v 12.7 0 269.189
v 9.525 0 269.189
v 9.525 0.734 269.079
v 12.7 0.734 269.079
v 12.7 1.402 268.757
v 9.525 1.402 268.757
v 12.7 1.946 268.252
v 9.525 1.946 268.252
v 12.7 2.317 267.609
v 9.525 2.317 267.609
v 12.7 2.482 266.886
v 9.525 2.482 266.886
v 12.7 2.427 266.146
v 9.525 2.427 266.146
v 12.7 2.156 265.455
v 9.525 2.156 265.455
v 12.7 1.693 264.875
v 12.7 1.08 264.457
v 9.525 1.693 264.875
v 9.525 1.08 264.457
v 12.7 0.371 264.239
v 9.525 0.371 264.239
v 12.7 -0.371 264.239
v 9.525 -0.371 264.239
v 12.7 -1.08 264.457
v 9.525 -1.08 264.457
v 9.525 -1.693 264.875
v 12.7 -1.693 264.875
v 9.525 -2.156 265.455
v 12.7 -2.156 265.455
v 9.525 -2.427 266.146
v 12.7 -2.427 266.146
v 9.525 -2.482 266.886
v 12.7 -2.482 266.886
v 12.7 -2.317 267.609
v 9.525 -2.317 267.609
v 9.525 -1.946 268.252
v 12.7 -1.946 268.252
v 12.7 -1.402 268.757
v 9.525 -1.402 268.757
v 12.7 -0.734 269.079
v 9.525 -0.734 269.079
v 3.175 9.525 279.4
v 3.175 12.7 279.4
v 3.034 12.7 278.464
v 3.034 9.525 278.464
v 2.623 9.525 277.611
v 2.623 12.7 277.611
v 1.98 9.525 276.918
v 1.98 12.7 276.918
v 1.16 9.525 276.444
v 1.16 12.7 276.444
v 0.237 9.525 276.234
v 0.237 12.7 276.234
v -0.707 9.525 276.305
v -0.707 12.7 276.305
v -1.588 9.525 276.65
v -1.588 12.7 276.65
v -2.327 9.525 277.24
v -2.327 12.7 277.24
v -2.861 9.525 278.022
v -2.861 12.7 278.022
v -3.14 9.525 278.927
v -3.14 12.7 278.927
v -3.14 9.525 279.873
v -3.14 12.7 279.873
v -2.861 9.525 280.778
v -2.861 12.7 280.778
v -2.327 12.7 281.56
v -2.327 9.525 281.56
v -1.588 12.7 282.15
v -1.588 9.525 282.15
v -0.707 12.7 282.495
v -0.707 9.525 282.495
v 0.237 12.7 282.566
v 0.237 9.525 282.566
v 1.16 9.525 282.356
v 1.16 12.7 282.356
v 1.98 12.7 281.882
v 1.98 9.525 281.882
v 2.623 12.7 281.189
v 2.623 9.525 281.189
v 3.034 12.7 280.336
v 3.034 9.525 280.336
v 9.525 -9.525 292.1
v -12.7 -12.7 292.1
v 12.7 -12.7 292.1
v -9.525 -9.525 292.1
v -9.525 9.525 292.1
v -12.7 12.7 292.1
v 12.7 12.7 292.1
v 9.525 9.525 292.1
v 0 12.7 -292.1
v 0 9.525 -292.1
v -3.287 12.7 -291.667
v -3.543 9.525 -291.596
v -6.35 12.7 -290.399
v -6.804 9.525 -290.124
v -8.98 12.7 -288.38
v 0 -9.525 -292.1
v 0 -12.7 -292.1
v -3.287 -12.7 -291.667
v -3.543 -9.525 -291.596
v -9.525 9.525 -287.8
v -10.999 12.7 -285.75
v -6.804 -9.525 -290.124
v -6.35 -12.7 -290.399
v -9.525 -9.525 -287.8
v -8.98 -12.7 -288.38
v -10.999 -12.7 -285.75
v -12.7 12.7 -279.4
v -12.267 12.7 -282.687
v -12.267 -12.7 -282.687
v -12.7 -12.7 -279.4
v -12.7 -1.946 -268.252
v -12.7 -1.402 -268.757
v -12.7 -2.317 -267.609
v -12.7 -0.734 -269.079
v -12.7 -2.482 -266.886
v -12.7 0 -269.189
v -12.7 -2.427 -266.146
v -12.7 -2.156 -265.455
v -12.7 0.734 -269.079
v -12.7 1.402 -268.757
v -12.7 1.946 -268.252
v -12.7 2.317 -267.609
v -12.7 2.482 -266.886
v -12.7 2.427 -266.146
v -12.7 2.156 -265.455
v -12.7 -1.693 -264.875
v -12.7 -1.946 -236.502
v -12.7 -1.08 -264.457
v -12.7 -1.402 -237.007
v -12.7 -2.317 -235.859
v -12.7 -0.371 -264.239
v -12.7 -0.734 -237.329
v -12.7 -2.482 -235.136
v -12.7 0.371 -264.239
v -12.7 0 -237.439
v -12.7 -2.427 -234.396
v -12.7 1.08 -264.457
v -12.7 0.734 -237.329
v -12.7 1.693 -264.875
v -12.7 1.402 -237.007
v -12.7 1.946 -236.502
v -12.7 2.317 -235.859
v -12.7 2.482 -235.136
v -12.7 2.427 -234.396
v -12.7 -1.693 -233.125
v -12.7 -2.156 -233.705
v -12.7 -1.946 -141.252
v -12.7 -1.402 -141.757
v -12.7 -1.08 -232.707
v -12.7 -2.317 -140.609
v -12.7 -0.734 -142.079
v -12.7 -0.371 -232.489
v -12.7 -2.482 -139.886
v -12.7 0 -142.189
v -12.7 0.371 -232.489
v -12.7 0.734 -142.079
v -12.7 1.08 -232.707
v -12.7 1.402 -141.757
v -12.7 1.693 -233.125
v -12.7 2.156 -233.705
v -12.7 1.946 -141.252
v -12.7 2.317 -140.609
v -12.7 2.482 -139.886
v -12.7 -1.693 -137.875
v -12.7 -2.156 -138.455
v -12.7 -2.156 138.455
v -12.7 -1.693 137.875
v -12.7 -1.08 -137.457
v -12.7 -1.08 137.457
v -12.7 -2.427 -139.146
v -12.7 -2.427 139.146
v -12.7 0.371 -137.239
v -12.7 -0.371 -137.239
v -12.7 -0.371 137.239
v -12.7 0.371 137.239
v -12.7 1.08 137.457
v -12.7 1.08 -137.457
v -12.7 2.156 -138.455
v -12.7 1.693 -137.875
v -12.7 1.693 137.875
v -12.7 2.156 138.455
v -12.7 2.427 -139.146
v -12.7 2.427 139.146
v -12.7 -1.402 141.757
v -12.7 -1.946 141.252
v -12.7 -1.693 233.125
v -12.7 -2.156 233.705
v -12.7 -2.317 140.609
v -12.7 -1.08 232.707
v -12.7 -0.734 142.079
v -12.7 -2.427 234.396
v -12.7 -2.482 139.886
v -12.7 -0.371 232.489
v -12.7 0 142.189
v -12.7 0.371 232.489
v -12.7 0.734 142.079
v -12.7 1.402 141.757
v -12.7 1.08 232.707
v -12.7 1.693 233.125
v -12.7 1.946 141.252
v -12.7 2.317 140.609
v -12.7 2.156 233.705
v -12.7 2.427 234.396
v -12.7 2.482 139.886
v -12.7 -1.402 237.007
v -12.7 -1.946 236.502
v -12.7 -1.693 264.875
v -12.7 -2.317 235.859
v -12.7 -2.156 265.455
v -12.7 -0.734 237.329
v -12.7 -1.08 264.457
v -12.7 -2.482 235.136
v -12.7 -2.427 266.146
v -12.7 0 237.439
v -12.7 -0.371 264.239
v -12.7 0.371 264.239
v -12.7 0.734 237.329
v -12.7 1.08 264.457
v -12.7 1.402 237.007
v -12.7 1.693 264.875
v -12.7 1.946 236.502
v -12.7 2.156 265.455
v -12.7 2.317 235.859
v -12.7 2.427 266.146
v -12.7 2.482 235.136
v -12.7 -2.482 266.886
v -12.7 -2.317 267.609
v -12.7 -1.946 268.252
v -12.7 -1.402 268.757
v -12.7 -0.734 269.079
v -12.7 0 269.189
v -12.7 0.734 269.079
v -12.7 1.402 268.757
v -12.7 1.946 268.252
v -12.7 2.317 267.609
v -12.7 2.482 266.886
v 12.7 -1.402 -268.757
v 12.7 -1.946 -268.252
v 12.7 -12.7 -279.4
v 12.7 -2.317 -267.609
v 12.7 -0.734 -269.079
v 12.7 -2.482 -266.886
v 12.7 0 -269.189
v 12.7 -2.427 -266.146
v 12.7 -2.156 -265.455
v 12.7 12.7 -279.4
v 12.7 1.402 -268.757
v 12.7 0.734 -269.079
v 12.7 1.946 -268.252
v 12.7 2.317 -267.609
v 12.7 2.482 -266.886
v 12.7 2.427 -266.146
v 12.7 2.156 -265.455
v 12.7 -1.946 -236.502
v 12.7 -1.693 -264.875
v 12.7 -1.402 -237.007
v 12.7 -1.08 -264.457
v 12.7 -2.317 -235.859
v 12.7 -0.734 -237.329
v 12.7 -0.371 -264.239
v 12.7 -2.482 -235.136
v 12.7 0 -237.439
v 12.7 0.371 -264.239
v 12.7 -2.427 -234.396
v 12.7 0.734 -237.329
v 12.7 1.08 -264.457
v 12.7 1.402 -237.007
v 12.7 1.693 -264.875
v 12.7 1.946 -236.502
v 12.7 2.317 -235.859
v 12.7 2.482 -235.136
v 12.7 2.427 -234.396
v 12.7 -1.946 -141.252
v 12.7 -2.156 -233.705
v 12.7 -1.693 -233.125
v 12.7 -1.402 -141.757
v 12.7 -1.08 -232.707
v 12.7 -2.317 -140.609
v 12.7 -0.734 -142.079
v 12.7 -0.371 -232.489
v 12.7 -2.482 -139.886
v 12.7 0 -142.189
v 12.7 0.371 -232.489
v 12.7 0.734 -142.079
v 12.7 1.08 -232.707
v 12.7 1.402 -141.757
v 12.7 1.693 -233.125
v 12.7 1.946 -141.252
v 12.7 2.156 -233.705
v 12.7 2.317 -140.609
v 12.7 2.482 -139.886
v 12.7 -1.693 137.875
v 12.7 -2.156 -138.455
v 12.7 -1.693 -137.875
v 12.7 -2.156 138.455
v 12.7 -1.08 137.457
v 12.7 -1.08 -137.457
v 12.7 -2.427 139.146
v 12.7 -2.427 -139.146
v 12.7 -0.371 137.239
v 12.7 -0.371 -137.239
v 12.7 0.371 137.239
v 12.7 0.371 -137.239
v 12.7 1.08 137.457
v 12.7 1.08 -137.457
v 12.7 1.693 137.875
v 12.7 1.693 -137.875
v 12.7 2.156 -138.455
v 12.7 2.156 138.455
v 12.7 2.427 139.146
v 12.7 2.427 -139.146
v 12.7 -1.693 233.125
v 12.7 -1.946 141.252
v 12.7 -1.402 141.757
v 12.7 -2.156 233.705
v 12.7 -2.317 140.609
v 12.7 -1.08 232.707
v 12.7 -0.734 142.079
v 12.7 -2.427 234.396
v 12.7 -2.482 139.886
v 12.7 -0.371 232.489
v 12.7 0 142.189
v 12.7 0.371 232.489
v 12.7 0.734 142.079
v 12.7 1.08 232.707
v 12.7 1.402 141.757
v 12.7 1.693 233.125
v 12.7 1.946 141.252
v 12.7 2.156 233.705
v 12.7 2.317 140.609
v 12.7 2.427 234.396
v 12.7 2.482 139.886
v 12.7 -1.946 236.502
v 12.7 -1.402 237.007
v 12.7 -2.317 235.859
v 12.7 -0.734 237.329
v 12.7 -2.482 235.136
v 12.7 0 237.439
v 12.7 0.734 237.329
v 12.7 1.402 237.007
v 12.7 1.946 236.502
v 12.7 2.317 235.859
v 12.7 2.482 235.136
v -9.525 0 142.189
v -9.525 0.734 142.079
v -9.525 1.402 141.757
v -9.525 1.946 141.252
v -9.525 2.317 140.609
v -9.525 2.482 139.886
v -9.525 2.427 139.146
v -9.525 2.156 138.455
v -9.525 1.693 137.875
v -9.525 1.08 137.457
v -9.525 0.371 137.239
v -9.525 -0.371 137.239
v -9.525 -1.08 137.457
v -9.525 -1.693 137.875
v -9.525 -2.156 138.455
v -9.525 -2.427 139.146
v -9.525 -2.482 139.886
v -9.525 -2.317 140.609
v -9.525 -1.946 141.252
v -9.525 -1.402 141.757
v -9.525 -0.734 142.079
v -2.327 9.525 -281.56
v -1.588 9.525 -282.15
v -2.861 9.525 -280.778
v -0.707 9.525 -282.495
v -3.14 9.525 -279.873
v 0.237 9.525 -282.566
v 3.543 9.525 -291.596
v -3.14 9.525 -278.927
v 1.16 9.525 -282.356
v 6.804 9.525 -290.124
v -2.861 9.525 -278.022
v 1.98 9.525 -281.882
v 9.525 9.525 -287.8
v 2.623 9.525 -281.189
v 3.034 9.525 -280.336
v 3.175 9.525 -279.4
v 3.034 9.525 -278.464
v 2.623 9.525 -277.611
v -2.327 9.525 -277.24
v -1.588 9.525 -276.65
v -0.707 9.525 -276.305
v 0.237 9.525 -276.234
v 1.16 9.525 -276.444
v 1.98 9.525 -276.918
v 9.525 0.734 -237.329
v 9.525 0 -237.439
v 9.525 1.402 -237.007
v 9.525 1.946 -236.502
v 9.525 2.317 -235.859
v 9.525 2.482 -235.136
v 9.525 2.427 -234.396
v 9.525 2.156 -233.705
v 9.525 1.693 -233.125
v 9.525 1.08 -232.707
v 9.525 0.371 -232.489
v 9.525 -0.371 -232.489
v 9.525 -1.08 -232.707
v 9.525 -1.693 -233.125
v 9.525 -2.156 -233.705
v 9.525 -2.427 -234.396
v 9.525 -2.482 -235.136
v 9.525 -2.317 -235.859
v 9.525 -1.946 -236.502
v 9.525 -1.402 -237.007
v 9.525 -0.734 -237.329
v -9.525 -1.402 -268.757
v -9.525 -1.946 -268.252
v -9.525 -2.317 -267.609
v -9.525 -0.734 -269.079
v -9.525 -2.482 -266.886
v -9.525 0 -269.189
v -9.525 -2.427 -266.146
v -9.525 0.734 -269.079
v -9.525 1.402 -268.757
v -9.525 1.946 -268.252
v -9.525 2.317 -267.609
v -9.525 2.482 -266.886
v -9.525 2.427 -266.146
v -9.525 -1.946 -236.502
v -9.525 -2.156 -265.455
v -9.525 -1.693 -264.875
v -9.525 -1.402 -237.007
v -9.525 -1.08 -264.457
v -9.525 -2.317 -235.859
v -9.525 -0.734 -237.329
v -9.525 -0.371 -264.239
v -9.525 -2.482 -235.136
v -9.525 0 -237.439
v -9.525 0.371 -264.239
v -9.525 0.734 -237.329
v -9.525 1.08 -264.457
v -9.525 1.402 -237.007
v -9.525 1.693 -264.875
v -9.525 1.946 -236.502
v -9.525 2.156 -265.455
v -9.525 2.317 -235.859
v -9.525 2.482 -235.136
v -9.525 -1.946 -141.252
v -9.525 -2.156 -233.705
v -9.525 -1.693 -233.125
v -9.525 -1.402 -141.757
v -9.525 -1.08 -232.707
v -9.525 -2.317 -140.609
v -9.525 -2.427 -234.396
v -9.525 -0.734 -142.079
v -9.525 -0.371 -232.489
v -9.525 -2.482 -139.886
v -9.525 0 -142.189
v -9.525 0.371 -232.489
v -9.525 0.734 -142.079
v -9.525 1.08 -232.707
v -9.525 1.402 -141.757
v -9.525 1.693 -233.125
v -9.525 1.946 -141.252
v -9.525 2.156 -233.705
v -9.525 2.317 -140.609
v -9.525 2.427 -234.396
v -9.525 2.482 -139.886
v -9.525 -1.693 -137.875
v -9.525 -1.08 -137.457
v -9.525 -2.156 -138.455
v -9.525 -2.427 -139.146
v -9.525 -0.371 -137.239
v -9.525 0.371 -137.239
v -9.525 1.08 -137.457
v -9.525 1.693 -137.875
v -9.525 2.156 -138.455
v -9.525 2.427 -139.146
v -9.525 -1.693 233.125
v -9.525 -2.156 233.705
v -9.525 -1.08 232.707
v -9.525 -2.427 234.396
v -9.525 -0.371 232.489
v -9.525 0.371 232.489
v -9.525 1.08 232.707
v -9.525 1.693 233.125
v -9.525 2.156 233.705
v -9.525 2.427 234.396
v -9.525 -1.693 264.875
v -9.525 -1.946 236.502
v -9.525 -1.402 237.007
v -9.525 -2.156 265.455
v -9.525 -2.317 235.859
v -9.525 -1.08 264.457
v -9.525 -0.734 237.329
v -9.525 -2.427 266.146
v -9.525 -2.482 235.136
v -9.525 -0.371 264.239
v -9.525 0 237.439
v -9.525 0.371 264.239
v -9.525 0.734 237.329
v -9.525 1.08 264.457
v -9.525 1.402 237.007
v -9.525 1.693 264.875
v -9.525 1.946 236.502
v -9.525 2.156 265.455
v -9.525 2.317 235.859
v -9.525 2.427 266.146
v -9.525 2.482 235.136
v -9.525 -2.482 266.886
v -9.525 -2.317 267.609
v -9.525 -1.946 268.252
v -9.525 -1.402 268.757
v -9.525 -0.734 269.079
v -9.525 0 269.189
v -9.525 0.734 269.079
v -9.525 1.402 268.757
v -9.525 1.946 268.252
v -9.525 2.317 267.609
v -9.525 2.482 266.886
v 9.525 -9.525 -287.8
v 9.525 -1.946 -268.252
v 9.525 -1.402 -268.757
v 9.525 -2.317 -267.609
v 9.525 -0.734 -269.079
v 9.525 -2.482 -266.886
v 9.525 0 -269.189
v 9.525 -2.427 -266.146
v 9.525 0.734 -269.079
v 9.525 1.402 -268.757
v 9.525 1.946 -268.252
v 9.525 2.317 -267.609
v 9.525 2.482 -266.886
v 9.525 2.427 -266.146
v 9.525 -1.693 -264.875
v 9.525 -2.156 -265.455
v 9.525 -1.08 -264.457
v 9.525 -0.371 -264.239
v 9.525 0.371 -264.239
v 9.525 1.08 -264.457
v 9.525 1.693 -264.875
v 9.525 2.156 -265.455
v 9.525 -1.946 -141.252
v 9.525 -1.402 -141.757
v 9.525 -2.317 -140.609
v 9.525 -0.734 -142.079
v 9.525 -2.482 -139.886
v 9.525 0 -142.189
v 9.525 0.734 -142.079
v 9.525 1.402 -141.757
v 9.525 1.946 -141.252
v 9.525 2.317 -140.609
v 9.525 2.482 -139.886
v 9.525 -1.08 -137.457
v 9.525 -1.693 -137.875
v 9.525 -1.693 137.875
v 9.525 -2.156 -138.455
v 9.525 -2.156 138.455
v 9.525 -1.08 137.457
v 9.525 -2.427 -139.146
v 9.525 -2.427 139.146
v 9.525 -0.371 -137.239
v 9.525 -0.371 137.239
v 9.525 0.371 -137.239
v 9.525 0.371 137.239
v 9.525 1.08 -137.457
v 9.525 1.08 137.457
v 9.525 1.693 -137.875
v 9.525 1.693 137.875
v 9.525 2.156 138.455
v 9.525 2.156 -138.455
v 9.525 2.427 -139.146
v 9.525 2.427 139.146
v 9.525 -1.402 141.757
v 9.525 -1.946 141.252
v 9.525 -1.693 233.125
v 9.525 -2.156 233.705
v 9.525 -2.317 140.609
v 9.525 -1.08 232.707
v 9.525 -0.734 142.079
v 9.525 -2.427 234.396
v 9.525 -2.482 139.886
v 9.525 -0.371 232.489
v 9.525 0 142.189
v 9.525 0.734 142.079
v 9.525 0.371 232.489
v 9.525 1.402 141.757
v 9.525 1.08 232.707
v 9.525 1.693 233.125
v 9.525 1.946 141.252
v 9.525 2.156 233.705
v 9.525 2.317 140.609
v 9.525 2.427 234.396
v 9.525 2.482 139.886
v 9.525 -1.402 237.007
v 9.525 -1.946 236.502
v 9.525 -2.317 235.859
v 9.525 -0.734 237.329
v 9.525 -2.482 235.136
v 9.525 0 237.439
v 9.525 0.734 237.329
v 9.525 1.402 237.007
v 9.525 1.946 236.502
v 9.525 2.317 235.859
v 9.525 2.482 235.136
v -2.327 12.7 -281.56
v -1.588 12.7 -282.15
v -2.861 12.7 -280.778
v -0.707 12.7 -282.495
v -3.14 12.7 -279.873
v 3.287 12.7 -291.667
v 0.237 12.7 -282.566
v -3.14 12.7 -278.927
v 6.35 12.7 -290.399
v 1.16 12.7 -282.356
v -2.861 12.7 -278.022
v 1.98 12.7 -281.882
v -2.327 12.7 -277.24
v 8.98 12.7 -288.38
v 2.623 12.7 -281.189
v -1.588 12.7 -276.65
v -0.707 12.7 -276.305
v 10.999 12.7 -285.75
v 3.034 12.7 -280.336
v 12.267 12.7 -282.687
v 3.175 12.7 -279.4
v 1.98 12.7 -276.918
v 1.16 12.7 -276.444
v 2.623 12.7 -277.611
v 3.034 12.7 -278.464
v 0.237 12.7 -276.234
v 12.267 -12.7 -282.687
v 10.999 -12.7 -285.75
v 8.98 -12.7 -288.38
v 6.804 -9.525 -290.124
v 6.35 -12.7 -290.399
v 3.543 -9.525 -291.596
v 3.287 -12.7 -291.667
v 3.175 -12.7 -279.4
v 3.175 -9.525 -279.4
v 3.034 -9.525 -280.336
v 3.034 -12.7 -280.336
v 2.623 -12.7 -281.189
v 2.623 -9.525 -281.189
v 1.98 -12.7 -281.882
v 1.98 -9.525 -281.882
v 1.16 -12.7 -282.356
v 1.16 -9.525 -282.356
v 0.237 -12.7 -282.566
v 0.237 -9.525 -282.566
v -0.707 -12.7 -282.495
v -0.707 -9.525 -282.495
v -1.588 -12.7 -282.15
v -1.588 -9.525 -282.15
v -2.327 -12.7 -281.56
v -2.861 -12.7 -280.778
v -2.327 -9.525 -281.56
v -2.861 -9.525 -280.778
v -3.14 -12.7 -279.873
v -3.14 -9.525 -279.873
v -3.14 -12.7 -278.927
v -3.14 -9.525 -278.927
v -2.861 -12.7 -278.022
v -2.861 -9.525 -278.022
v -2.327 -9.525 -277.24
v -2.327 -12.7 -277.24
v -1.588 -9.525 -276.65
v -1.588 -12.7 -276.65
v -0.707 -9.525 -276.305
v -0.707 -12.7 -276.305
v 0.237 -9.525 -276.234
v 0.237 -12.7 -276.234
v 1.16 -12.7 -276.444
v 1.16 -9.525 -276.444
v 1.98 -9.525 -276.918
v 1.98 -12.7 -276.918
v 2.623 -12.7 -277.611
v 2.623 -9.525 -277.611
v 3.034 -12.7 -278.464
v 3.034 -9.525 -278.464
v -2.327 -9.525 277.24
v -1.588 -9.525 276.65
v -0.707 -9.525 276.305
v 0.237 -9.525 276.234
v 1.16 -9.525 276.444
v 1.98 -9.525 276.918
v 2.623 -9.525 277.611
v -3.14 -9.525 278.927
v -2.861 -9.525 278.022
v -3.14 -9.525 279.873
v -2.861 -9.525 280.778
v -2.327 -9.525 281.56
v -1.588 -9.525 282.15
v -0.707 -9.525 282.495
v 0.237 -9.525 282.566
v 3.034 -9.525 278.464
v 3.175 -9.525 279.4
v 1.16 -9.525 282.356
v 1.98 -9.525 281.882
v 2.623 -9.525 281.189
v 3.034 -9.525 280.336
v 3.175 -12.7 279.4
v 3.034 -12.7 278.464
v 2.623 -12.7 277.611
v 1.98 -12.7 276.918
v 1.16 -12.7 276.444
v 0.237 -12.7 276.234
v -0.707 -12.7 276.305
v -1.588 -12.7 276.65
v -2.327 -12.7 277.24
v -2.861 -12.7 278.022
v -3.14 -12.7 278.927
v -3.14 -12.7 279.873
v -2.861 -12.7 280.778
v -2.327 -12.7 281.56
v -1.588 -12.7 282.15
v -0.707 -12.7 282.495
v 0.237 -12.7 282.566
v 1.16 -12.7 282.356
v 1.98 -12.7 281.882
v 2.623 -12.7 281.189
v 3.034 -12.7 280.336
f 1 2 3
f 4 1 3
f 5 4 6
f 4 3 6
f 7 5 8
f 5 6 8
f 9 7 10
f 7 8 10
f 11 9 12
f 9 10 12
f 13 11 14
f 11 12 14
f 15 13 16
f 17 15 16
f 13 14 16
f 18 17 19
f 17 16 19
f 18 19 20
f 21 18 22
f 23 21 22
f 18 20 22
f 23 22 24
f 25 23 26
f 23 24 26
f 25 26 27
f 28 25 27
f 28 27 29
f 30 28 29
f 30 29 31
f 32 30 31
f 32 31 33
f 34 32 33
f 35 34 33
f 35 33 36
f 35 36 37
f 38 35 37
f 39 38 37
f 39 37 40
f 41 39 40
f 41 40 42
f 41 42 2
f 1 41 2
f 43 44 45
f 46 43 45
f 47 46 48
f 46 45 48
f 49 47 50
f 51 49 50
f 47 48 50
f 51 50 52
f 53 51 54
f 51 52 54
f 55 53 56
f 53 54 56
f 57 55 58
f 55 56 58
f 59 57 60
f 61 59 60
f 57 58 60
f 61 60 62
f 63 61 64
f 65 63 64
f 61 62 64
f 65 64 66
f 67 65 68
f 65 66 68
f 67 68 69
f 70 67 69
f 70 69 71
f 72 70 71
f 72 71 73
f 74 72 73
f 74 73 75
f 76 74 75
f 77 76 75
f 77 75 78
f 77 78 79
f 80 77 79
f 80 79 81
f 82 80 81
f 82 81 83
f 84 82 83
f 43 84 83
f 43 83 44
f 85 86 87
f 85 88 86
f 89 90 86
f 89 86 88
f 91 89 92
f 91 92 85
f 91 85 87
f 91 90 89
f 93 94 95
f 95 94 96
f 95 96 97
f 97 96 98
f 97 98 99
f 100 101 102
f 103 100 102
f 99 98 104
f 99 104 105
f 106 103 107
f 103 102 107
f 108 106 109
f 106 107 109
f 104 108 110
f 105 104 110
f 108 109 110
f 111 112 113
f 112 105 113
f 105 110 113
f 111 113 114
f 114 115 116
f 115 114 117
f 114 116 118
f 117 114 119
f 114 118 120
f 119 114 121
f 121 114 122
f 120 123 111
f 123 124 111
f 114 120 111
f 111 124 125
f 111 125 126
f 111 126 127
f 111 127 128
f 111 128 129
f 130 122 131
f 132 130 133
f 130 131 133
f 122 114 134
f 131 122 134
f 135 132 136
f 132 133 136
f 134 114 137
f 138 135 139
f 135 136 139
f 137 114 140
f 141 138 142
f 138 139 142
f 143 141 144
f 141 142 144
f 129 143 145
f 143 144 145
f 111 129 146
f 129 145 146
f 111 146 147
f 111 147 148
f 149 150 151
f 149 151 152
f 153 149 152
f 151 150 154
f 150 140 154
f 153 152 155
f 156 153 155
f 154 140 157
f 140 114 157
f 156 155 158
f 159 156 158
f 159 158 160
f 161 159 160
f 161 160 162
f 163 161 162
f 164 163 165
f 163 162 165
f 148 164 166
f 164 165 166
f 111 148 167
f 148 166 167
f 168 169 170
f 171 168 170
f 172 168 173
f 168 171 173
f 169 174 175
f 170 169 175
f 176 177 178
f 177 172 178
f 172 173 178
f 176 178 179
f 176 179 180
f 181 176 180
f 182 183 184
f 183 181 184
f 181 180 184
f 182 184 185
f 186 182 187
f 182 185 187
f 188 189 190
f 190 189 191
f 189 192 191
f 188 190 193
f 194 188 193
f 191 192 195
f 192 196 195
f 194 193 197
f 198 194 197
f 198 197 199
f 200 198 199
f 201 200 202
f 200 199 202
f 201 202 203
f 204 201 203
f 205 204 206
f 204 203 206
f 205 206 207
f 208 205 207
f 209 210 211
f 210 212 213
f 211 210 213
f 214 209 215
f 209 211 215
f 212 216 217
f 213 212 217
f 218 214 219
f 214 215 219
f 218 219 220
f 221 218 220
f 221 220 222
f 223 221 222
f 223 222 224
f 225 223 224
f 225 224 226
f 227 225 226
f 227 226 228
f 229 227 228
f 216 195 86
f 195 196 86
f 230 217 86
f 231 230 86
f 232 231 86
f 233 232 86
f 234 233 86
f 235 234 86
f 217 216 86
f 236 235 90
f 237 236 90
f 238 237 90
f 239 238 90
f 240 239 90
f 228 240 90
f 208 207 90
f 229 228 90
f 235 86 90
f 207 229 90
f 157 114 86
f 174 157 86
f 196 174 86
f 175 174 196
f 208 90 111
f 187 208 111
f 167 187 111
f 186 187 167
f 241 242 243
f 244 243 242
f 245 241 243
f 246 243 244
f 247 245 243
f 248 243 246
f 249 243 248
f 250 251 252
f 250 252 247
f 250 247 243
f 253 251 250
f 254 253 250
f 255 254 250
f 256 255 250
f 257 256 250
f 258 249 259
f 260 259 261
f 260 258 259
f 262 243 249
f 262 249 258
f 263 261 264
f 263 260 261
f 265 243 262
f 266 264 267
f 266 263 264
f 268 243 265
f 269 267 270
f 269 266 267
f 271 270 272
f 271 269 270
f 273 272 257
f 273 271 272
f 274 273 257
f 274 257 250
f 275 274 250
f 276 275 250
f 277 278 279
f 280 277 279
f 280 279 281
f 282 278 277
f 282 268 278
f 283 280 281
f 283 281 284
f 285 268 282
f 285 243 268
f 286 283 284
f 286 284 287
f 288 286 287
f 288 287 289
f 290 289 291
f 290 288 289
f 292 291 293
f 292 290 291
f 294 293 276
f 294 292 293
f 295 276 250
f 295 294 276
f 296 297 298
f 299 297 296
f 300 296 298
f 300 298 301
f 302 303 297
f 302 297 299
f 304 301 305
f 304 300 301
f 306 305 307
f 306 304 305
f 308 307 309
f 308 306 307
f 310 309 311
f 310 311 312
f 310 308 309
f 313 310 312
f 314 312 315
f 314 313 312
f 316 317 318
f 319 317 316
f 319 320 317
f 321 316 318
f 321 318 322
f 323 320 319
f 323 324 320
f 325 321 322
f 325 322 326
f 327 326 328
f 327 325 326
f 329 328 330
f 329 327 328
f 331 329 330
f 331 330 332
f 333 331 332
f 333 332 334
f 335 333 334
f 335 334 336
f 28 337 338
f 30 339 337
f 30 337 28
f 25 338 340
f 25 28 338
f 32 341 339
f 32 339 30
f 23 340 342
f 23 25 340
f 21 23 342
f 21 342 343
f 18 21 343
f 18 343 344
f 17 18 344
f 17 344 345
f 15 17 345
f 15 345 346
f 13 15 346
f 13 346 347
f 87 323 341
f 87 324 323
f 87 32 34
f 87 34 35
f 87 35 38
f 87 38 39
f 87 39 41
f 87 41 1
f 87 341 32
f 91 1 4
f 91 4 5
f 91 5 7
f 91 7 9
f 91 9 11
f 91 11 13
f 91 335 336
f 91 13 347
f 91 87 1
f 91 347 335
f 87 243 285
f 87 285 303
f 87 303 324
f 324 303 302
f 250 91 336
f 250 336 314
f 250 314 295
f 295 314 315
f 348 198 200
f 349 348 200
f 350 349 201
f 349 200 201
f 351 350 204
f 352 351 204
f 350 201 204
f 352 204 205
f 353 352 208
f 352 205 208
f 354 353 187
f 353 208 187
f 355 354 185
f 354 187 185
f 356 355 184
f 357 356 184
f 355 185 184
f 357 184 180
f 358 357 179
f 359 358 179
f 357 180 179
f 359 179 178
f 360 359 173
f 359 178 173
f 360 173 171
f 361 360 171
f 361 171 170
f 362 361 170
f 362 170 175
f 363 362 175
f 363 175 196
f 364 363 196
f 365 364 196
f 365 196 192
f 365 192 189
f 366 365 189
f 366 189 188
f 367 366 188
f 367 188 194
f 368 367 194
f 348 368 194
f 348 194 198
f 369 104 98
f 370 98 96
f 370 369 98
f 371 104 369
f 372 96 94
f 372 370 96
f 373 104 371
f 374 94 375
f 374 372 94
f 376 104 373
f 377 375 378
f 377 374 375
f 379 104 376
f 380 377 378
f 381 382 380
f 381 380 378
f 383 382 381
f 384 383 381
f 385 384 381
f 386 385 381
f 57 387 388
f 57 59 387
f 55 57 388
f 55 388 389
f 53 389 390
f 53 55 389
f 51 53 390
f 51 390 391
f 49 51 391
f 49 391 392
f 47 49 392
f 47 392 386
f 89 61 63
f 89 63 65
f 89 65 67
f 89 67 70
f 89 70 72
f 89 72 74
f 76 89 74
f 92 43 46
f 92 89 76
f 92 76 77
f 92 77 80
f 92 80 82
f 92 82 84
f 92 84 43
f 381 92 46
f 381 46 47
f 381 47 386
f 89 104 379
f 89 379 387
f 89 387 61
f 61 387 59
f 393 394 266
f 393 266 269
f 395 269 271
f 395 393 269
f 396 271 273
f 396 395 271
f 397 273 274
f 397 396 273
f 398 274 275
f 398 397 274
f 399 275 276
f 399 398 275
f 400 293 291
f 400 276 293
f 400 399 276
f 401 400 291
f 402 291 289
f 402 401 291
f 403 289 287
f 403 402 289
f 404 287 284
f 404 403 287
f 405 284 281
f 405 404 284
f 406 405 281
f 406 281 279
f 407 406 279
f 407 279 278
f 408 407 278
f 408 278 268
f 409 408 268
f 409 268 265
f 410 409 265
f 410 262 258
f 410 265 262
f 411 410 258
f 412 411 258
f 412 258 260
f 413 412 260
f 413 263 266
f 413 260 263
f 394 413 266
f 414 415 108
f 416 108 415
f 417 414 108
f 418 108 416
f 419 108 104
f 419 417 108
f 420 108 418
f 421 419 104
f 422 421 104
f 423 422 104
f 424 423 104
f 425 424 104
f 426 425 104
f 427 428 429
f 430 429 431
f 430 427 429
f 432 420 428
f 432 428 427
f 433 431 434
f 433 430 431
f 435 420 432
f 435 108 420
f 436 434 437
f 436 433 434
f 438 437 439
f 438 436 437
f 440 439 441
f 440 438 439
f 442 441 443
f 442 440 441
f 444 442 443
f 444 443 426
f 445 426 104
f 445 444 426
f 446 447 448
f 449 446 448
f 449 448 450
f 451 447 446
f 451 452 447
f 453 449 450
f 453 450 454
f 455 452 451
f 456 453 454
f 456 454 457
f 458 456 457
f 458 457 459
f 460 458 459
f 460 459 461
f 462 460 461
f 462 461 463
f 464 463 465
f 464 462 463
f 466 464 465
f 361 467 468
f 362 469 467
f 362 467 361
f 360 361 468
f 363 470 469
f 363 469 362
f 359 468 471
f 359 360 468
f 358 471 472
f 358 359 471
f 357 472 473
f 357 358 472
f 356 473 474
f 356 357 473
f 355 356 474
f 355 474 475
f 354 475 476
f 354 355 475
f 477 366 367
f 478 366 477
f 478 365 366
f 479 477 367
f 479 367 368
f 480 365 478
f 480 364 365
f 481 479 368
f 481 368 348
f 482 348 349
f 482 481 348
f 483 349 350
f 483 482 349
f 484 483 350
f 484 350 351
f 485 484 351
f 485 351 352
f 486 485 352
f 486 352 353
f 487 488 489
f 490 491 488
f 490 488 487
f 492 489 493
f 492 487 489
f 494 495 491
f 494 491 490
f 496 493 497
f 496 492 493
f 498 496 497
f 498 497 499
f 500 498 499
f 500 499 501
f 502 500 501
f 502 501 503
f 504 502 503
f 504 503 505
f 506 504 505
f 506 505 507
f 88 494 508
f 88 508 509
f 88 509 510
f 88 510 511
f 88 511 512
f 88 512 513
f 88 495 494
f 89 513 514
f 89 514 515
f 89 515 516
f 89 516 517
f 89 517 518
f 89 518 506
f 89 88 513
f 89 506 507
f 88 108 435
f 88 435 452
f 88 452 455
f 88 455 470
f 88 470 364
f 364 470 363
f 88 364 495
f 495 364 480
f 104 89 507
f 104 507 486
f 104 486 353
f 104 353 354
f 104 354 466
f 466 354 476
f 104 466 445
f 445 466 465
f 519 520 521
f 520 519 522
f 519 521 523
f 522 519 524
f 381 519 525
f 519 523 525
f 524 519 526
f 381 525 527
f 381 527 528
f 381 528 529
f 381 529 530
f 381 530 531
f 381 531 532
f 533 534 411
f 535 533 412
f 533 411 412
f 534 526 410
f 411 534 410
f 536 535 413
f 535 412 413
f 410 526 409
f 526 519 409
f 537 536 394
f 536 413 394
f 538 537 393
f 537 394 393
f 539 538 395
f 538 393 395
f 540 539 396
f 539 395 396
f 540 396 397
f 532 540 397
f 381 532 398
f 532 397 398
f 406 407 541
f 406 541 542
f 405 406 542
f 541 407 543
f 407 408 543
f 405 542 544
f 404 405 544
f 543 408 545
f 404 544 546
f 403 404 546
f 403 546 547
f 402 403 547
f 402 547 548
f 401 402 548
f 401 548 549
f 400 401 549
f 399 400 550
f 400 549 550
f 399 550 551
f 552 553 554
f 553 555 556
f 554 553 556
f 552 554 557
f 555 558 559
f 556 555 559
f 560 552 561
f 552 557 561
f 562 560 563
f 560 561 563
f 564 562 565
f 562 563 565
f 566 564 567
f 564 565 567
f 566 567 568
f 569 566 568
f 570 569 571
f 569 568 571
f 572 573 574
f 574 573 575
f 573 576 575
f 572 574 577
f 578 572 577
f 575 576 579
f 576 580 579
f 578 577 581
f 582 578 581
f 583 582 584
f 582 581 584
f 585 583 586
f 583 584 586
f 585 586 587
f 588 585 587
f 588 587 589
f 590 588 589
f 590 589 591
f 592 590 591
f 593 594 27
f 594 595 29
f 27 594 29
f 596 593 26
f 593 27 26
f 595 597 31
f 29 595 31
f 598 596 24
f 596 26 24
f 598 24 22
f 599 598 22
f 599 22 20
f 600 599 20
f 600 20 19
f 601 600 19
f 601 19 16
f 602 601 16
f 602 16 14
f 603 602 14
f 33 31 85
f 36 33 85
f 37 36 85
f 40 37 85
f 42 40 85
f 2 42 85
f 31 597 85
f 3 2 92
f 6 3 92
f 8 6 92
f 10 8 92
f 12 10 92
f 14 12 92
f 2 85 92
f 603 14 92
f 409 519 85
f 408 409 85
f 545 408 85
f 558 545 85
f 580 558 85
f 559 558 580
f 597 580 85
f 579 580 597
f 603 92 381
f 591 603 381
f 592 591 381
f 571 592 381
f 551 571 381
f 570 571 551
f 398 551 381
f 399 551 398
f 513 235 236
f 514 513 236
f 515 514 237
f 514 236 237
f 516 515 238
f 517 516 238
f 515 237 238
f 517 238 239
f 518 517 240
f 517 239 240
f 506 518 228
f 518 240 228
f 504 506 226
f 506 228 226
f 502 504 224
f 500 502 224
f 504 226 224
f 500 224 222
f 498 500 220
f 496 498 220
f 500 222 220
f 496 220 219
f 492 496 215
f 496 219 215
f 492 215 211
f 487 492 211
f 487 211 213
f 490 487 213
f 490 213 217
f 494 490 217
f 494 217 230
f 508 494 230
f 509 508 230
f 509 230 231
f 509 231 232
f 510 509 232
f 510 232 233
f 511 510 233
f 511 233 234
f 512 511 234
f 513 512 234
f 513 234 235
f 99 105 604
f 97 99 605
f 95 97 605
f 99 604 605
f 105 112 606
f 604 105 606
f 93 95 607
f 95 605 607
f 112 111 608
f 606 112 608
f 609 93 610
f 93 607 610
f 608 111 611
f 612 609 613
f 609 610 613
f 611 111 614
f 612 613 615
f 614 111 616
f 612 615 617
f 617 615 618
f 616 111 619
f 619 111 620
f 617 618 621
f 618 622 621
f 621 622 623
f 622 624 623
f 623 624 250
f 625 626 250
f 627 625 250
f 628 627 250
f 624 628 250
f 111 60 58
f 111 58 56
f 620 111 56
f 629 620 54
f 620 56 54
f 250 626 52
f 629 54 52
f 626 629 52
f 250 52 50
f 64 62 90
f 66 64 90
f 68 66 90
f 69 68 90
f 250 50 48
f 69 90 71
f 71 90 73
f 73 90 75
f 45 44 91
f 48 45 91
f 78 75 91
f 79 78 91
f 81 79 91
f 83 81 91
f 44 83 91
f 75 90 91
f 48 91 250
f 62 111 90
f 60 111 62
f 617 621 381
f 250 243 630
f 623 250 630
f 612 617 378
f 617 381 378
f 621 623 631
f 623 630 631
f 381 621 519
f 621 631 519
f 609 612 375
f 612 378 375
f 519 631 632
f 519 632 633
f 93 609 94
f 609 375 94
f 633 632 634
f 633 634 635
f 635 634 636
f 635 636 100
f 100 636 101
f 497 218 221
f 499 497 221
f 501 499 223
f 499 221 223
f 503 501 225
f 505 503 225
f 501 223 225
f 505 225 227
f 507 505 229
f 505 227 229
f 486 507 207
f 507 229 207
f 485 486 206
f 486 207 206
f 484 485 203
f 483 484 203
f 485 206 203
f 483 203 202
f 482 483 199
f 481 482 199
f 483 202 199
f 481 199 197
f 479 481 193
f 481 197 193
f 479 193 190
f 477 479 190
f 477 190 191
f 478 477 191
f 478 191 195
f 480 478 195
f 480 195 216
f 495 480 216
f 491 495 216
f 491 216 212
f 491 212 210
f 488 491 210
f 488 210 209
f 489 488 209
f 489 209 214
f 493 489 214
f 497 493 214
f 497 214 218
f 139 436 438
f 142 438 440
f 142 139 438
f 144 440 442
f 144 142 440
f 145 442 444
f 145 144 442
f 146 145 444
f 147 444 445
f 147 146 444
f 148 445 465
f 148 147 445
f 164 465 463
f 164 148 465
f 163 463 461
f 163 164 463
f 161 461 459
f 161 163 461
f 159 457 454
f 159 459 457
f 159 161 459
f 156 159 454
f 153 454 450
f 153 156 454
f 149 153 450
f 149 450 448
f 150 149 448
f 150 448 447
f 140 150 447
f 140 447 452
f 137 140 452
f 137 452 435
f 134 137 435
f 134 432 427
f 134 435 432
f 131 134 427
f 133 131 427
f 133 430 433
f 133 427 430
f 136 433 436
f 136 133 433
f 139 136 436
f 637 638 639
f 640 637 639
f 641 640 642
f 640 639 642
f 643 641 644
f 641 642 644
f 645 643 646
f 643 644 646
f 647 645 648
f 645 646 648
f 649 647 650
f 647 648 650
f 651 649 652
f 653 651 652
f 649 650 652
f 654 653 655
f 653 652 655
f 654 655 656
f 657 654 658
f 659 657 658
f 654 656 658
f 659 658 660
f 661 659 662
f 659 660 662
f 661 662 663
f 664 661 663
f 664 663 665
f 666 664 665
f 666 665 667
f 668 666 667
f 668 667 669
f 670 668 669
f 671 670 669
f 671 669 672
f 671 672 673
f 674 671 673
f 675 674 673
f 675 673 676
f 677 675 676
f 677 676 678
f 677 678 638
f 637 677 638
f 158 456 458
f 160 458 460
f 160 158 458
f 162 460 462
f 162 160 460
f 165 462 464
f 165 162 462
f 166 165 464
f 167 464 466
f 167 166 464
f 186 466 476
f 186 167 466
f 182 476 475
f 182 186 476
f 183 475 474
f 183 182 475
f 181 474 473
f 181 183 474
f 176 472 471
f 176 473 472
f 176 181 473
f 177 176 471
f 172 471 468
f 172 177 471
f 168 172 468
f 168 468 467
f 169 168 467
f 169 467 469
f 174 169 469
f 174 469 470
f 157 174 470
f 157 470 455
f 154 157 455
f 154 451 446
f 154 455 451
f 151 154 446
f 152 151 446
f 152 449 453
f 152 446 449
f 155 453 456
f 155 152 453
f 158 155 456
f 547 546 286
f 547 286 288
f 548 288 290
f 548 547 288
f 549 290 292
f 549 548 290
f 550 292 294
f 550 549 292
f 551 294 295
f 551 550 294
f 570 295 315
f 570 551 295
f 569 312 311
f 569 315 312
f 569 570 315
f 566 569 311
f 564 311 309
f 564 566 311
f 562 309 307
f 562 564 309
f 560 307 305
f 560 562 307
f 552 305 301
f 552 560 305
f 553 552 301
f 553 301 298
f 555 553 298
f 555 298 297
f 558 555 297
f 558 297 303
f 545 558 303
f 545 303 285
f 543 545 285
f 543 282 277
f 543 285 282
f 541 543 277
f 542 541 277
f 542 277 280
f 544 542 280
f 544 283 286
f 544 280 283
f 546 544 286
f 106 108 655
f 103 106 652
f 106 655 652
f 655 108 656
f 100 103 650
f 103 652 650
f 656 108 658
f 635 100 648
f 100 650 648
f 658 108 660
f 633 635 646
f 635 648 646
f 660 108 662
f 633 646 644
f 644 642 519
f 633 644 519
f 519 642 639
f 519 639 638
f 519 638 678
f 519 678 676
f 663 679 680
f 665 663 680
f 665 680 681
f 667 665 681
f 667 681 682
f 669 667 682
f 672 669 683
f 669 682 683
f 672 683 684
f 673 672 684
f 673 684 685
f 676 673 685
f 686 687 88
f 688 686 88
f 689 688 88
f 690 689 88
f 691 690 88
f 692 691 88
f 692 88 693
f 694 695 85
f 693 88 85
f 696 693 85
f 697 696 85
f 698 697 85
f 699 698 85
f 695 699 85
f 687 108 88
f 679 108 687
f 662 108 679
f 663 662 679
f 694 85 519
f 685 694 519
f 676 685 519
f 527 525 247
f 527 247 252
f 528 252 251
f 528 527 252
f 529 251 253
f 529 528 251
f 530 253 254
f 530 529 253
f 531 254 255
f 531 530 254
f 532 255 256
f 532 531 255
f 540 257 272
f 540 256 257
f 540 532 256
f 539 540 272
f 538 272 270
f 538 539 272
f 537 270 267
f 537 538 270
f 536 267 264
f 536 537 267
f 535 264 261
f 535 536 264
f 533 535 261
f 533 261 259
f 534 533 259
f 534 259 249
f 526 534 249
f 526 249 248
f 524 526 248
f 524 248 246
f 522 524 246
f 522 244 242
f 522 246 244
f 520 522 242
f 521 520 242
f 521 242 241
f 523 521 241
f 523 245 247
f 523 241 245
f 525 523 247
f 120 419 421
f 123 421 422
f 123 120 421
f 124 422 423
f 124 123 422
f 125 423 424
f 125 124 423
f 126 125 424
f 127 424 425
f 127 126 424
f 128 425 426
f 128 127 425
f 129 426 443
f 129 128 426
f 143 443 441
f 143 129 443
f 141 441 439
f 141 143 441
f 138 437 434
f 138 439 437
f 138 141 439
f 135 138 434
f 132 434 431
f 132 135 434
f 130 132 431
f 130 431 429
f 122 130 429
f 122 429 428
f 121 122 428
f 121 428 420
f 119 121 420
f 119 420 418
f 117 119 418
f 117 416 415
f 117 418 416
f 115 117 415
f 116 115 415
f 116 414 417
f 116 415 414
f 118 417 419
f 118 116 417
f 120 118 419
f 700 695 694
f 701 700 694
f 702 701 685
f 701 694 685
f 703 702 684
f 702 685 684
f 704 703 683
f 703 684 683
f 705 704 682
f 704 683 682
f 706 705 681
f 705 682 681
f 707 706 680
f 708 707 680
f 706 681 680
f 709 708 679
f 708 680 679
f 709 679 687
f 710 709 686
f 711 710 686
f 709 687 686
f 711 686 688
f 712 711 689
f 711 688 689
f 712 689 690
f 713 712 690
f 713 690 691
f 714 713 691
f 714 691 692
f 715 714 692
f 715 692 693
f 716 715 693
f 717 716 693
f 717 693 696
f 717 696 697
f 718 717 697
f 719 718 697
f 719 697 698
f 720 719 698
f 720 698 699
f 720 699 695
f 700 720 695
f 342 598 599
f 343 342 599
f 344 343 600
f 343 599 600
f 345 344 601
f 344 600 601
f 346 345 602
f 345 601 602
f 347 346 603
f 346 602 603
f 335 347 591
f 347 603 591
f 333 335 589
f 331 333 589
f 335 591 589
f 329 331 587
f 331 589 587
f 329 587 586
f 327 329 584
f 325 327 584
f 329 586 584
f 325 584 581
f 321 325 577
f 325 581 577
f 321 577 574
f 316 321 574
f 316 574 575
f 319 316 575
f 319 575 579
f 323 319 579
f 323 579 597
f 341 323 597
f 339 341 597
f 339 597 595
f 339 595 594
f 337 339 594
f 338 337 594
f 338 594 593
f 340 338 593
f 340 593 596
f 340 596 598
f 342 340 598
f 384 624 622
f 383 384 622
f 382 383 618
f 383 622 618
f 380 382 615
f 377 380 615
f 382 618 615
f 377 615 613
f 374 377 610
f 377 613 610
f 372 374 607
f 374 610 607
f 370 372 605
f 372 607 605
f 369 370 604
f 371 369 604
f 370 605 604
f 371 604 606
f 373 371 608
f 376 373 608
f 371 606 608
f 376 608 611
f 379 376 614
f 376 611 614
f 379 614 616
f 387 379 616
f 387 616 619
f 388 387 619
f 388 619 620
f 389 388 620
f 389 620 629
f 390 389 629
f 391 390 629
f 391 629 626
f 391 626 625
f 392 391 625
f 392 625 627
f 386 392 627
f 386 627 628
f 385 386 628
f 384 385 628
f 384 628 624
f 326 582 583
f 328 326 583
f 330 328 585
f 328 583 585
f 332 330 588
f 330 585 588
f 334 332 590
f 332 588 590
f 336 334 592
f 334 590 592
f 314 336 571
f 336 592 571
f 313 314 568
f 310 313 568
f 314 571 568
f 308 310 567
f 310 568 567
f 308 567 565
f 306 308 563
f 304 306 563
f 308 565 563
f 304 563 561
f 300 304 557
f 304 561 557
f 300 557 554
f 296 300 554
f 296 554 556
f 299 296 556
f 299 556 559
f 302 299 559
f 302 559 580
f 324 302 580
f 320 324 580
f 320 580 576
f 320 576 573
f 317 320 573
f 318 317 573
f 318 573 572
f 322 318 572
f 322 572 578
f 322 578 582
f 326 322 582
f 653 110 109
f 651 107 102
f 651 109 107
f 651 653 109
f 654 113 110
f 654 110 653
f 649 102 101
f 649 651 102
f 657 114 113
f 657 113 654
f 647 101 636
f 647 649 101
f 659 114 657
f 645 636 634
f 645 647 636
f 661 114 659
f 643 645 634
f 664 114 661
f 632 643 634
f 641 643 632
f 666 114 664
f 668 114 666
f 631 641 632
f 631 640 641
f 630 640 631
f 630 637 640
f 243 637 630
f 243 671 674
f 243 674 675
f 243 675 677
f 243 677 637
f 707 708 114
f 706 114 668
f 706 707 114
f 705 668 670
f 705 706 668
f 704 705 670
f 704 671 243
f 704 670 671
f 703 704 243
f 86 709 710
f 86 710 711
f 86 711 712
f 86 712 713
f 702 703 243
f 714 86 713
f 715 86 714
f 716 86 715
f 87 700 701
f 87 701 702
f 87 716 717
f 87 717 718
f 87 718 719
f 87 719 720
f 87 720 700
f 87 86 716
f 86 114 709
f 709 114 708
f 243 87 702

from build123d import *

# Parameters (mm, degrees)
SKETCH1_W           = 25.4
SKETCH1_H           = 25.4
SKETCH1_W_2         = 19.05
SKETCH1_H_2         = 19.05
EXTRUDE_THIN1_DEPTH = 292.1
SKETCH4_R           = 2.4892
CUT_EXTRUDE1_DEPTH  = 26.4
CUT_EXTRUDE2_DEPTH  = 26.4
SKETCH3_R           = 3.175
CUT_EXTRUDE3_DEPTH  = 26.4


with BuildPart() as part:
    # Sketch1 → Extrude-Thin1 (new body, symmetric)
    with BuildSketch(Plane.XY):
        Rectangle(SKETCH1_W, SKETCH1_H)
        Rectangle(SKETCH1_W_2, SKETCH1_H_2, mode=Mode.SUBTRACT)
    extrude(amount=EXTRUDE_THIN1_DEPTH, both=True)

    # Sketch4 → Cut-Extrude1 (cut, through all)
    with BuildSketch(Plane.ZY.offset(12.7)):
        with Locations((266.7, 0)):
            Circle(SKETCH4_R)
        with Locations((139.7, 0)):
            Circle(SKETCH4_R)
        with Locations((234.949999999, 0)):
            Circle(SKETCH4_R)
    cut_extrude1 = extrude(amount=-CUT_EXTRUDE1_DEPTH, mode=Mode.SUBTRACT)

    # Mirror1: Cut-Extrude1 across plane
    add(cut_extrude1.mirror(Plane(origin=(0, 0, 0), x_dir=(1, 0, 0), z_dir=(0, 0, -1))), mode=Mode.SUBTRACT)

    # Sketch5 → Cut-Extrude2 (cut, through all)
    with BuildSketch(Plane.XZ.offset(12.7)):
        Polygon((12.7, -298.45), (12.7, -292.1), (-6.7e-08, -292.1), (-12.7, -292.1), (-12.7, -298.45), align=None)
        with BuildLine():
            ThreePointArc((-6.7e-08, -292.1), (-8.980256145, -288.380256097), (-12.7, -279.4))
            Line((-12.7, -279.4), (-12.7, -292.1))
            Line((-12.7, -292.1), (-6.7e-08, -292.1))
        make_face()
        with BuildLine():
            Line((12.7, -292.1), (12.7, -279.4))
            ThreePointArc((12.7, -279.4), (8.980256097, -288.380256145), (-6.7e-08, -292.1))
            Line((-6.7e-08, -292.1), (12.7, -292.1))
        make_face()
    extrude(amount=-CUT_EXTRUDE2_DEPTH, mode=Mode.SUBTRACT)

    # Sketch3 → Cut-Extrude3 (cut, through all)
    with BuildSketch(Plane(origin=(0, 12.7, 0), x_dir=(1, 0, 0), z_dir=(0, 1, 0))):
        with Locations((0, 279.4)):
            Circle(SKETCH3_R)
        with Locations((0, -279.4)):
            Circle(SKETCH3_R)
    extrude(amount=-CUT_EXTRUDE3_DEPTH, mode=Mode.SUBTRACT)


solid = part.part
